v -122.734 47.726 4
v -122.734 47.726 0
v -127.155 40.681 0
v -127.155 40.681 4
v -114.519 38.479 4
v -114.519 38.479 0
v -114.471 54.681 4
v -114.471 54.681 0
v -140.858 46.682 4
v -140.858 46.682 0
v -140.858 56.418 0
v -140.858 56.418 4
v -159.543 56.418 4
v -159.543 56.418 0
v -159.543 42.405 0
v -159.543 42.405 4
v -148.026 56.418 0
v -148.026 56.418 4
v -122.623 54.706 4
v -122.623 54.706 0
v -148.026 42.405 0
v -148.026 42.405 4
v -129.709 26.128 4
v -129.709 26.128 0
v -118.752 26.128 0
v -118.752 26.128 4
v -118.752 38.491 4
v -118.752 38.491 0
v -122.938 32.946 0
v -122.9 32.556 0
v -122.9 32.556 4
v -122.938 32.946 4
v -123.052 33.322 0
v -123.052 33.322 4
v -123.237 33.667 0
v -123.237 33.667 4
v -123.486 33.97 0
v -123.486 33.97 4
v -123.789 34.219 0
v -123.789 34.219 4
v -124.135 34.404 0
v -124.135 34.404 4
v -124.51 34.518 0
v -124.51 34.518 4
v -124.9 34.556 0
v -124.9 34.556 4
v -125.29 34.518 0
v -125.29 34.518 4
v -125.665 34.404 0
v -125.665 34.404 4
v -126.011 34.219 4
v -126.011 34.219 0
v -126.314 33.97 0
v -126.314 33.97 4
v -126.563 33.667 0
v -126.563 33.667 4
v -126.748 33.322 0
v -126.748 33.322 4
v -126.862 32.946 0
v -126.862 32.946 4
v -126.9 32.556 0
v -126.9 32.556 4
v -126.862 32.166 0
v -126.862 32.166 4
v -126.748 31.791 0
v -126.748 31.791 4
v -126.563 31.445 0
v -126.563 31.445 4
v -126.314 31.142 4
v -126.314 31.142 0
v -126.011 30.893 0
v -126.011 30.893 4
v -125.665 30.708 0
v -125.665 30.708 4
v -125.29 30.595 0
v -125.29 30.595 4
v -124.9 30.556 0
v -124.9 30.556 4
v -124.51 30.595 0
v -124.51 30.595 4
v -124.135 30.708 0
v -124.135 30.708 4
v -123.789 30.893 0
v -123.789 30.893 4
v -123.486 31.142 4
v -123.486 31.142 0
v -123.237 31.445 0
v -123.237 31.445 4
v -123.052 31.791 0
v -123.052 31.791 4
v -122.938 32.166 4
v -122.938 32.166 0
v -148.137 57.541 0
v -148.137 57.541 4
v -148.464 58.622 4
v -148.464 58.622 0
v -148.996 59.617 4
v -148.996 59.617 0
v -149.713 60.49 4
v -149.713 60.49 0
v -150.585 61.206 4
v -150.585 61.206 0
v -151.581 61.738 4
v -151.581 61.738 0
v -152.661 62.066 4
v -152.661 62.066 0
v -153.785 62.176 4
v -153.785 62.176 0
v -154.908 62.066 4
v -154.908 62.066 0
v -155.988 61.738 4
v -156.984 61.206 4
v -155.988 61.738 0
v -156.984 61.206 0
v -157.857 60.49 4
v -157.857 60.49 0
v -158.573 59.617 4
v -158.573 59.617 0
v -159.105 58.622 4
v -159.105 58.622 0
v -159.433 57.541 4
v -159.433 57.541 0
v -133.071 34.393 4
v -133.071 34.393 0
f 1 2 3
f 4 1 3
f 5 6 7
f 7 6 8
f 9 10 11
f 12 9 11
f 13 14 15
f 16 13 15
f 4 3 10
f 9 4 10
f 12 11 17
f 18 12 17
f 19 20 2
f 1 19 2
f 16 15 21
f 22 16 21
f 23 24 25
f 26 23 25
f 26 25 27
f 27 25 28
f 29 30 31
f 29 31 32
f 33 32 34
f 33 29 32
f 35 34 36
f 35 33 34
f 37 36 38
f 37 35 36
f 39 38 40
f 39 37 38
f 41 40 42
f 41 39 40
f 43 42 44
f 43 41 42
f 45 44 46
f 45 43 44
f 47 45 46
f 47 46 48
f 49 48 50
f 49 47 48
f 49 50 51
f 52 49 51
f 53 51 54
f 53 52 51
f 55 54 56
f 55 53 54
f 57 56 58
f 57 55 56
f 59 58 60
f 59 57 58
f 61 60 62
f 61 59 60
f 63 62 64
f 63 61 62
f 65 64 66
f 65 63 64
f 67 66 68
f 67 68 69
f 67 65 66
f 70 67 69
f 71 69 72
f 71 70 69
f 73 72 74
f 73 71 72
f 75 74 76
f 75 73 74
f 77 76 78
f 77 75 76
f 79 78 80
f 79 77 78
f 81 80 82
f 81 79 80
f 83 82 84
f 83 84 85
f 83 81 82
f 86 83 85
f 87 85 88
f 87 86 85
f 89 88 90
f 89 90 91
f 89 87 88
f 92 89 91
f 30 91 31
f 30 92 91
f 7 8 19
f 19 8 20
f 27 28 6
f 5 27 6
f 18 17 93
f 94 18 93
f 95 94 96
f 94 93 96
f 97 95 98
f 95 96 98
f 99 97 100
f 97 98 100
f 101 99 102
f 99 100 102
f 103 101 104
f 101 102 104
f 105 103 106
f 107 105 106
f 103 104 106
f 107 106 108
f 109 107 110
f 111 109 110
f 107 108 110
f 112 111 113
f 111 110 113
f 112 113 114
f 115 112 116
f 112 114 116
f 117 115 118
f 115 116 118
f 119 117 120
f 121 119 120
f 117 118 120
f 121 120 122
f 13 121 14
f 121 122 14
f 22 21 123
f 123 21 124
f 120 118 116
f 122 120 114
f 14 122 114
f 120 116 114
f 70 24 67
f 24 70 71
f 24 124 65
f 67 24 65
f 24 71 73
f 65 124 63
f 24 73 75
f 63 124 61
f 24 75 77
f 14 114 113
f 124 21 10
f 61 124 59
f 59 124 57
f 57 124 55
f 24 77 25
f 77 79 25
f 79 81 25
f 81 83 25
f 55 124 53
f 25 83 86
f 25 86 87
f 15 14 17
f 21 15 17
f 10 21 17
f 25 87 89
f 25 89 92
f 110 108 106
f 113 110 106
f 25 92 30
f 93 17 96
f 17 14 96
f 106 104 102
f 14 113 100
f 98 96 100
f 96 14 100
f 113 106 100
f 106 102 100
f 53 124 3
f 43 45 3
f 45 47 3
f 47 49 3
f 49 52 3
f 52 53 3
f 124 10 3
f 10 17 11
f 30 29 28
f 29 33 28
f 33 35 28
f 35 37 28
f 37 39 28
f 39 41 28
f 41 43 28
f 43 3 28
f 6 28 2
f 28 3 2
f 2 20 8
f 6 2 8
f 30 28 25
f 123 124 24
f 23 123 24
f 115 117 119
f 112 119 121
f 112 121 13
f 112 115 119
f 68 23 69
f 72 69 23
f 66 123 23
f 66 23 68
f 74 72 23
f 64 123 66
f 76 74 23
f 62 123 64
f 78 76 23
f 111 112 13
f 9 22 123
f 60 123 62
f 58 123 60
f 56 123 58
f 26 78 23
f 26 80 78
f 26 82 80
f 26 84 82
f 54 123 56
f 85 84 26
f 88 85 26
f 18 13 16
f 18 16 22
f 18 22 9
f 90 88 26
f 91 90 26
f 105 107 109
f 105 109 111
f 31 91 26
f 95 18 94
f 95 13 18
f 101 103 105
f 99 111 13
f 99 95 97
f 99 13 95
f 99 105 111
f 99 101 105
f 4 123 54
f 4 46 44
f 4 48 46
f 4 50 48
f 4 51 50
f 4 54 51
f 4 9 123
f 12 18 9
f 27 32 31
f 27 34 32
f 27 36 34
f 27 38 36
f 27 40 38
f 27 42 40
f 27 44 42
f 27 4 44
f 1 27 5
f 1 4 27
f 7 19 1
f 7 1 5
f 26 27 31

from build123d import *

# Parameters (mm, degrees)
F0_R     = 2
F1_DEPTH = 4


with BuildPart() as f1:
    # F0 (on Top) → F1 (new body)
    with BuildSketch(Plane.XY):
        with BuildLine():
            Line((-159.543321, 56.417756), (-159.543321, 42.404792))
            Line((-159.543321, 42.404792), (-148.025898, 42.404792))
            Line((-148.025898, 42.404792), (-133.070684, 34.393251))
            Line((-133.070684, 34.393251), (-129.709324, 26.128011))
            Line((-129.709324, 26.128011), (-118.751742, 26.128011))
            Line((-118.751742, 26.128011), (-118.751742, 38.491473))
            Line((-118.751742, 38.491473), (-114.518747, 38.478882))
            Line((-114.518747, 38.478882), (-114.470554, 54.681407))
            Line((-114.470554, 54.681407), (-122.62332, 54.705656))
            Line((-122.62332, 54.705656), (-122.733846, 47.726375))
            Line((-122.733846, 47.726375), (-127.154761, 40.680661))
            Line((-127.154761, 40.680661), (-140.857846, 46.682025))
            Line((-140.857846, 46.682025), (-140.857846, 56.417756))
            Line((-140.857846, 56.417756), (-148.025898, 56.417756))
            ThreePointArc((-148.025898, 56.417756), (-153.784609, 62.176467), (-159.543321, 56.417756))
        make_face()
        with Locations((-124.899976, 32.55615)):
            Circle(F0_R, mode=Mode.SUBTRACT)
    extrude(amount=F1_DEPTH)


solid = f1.part
